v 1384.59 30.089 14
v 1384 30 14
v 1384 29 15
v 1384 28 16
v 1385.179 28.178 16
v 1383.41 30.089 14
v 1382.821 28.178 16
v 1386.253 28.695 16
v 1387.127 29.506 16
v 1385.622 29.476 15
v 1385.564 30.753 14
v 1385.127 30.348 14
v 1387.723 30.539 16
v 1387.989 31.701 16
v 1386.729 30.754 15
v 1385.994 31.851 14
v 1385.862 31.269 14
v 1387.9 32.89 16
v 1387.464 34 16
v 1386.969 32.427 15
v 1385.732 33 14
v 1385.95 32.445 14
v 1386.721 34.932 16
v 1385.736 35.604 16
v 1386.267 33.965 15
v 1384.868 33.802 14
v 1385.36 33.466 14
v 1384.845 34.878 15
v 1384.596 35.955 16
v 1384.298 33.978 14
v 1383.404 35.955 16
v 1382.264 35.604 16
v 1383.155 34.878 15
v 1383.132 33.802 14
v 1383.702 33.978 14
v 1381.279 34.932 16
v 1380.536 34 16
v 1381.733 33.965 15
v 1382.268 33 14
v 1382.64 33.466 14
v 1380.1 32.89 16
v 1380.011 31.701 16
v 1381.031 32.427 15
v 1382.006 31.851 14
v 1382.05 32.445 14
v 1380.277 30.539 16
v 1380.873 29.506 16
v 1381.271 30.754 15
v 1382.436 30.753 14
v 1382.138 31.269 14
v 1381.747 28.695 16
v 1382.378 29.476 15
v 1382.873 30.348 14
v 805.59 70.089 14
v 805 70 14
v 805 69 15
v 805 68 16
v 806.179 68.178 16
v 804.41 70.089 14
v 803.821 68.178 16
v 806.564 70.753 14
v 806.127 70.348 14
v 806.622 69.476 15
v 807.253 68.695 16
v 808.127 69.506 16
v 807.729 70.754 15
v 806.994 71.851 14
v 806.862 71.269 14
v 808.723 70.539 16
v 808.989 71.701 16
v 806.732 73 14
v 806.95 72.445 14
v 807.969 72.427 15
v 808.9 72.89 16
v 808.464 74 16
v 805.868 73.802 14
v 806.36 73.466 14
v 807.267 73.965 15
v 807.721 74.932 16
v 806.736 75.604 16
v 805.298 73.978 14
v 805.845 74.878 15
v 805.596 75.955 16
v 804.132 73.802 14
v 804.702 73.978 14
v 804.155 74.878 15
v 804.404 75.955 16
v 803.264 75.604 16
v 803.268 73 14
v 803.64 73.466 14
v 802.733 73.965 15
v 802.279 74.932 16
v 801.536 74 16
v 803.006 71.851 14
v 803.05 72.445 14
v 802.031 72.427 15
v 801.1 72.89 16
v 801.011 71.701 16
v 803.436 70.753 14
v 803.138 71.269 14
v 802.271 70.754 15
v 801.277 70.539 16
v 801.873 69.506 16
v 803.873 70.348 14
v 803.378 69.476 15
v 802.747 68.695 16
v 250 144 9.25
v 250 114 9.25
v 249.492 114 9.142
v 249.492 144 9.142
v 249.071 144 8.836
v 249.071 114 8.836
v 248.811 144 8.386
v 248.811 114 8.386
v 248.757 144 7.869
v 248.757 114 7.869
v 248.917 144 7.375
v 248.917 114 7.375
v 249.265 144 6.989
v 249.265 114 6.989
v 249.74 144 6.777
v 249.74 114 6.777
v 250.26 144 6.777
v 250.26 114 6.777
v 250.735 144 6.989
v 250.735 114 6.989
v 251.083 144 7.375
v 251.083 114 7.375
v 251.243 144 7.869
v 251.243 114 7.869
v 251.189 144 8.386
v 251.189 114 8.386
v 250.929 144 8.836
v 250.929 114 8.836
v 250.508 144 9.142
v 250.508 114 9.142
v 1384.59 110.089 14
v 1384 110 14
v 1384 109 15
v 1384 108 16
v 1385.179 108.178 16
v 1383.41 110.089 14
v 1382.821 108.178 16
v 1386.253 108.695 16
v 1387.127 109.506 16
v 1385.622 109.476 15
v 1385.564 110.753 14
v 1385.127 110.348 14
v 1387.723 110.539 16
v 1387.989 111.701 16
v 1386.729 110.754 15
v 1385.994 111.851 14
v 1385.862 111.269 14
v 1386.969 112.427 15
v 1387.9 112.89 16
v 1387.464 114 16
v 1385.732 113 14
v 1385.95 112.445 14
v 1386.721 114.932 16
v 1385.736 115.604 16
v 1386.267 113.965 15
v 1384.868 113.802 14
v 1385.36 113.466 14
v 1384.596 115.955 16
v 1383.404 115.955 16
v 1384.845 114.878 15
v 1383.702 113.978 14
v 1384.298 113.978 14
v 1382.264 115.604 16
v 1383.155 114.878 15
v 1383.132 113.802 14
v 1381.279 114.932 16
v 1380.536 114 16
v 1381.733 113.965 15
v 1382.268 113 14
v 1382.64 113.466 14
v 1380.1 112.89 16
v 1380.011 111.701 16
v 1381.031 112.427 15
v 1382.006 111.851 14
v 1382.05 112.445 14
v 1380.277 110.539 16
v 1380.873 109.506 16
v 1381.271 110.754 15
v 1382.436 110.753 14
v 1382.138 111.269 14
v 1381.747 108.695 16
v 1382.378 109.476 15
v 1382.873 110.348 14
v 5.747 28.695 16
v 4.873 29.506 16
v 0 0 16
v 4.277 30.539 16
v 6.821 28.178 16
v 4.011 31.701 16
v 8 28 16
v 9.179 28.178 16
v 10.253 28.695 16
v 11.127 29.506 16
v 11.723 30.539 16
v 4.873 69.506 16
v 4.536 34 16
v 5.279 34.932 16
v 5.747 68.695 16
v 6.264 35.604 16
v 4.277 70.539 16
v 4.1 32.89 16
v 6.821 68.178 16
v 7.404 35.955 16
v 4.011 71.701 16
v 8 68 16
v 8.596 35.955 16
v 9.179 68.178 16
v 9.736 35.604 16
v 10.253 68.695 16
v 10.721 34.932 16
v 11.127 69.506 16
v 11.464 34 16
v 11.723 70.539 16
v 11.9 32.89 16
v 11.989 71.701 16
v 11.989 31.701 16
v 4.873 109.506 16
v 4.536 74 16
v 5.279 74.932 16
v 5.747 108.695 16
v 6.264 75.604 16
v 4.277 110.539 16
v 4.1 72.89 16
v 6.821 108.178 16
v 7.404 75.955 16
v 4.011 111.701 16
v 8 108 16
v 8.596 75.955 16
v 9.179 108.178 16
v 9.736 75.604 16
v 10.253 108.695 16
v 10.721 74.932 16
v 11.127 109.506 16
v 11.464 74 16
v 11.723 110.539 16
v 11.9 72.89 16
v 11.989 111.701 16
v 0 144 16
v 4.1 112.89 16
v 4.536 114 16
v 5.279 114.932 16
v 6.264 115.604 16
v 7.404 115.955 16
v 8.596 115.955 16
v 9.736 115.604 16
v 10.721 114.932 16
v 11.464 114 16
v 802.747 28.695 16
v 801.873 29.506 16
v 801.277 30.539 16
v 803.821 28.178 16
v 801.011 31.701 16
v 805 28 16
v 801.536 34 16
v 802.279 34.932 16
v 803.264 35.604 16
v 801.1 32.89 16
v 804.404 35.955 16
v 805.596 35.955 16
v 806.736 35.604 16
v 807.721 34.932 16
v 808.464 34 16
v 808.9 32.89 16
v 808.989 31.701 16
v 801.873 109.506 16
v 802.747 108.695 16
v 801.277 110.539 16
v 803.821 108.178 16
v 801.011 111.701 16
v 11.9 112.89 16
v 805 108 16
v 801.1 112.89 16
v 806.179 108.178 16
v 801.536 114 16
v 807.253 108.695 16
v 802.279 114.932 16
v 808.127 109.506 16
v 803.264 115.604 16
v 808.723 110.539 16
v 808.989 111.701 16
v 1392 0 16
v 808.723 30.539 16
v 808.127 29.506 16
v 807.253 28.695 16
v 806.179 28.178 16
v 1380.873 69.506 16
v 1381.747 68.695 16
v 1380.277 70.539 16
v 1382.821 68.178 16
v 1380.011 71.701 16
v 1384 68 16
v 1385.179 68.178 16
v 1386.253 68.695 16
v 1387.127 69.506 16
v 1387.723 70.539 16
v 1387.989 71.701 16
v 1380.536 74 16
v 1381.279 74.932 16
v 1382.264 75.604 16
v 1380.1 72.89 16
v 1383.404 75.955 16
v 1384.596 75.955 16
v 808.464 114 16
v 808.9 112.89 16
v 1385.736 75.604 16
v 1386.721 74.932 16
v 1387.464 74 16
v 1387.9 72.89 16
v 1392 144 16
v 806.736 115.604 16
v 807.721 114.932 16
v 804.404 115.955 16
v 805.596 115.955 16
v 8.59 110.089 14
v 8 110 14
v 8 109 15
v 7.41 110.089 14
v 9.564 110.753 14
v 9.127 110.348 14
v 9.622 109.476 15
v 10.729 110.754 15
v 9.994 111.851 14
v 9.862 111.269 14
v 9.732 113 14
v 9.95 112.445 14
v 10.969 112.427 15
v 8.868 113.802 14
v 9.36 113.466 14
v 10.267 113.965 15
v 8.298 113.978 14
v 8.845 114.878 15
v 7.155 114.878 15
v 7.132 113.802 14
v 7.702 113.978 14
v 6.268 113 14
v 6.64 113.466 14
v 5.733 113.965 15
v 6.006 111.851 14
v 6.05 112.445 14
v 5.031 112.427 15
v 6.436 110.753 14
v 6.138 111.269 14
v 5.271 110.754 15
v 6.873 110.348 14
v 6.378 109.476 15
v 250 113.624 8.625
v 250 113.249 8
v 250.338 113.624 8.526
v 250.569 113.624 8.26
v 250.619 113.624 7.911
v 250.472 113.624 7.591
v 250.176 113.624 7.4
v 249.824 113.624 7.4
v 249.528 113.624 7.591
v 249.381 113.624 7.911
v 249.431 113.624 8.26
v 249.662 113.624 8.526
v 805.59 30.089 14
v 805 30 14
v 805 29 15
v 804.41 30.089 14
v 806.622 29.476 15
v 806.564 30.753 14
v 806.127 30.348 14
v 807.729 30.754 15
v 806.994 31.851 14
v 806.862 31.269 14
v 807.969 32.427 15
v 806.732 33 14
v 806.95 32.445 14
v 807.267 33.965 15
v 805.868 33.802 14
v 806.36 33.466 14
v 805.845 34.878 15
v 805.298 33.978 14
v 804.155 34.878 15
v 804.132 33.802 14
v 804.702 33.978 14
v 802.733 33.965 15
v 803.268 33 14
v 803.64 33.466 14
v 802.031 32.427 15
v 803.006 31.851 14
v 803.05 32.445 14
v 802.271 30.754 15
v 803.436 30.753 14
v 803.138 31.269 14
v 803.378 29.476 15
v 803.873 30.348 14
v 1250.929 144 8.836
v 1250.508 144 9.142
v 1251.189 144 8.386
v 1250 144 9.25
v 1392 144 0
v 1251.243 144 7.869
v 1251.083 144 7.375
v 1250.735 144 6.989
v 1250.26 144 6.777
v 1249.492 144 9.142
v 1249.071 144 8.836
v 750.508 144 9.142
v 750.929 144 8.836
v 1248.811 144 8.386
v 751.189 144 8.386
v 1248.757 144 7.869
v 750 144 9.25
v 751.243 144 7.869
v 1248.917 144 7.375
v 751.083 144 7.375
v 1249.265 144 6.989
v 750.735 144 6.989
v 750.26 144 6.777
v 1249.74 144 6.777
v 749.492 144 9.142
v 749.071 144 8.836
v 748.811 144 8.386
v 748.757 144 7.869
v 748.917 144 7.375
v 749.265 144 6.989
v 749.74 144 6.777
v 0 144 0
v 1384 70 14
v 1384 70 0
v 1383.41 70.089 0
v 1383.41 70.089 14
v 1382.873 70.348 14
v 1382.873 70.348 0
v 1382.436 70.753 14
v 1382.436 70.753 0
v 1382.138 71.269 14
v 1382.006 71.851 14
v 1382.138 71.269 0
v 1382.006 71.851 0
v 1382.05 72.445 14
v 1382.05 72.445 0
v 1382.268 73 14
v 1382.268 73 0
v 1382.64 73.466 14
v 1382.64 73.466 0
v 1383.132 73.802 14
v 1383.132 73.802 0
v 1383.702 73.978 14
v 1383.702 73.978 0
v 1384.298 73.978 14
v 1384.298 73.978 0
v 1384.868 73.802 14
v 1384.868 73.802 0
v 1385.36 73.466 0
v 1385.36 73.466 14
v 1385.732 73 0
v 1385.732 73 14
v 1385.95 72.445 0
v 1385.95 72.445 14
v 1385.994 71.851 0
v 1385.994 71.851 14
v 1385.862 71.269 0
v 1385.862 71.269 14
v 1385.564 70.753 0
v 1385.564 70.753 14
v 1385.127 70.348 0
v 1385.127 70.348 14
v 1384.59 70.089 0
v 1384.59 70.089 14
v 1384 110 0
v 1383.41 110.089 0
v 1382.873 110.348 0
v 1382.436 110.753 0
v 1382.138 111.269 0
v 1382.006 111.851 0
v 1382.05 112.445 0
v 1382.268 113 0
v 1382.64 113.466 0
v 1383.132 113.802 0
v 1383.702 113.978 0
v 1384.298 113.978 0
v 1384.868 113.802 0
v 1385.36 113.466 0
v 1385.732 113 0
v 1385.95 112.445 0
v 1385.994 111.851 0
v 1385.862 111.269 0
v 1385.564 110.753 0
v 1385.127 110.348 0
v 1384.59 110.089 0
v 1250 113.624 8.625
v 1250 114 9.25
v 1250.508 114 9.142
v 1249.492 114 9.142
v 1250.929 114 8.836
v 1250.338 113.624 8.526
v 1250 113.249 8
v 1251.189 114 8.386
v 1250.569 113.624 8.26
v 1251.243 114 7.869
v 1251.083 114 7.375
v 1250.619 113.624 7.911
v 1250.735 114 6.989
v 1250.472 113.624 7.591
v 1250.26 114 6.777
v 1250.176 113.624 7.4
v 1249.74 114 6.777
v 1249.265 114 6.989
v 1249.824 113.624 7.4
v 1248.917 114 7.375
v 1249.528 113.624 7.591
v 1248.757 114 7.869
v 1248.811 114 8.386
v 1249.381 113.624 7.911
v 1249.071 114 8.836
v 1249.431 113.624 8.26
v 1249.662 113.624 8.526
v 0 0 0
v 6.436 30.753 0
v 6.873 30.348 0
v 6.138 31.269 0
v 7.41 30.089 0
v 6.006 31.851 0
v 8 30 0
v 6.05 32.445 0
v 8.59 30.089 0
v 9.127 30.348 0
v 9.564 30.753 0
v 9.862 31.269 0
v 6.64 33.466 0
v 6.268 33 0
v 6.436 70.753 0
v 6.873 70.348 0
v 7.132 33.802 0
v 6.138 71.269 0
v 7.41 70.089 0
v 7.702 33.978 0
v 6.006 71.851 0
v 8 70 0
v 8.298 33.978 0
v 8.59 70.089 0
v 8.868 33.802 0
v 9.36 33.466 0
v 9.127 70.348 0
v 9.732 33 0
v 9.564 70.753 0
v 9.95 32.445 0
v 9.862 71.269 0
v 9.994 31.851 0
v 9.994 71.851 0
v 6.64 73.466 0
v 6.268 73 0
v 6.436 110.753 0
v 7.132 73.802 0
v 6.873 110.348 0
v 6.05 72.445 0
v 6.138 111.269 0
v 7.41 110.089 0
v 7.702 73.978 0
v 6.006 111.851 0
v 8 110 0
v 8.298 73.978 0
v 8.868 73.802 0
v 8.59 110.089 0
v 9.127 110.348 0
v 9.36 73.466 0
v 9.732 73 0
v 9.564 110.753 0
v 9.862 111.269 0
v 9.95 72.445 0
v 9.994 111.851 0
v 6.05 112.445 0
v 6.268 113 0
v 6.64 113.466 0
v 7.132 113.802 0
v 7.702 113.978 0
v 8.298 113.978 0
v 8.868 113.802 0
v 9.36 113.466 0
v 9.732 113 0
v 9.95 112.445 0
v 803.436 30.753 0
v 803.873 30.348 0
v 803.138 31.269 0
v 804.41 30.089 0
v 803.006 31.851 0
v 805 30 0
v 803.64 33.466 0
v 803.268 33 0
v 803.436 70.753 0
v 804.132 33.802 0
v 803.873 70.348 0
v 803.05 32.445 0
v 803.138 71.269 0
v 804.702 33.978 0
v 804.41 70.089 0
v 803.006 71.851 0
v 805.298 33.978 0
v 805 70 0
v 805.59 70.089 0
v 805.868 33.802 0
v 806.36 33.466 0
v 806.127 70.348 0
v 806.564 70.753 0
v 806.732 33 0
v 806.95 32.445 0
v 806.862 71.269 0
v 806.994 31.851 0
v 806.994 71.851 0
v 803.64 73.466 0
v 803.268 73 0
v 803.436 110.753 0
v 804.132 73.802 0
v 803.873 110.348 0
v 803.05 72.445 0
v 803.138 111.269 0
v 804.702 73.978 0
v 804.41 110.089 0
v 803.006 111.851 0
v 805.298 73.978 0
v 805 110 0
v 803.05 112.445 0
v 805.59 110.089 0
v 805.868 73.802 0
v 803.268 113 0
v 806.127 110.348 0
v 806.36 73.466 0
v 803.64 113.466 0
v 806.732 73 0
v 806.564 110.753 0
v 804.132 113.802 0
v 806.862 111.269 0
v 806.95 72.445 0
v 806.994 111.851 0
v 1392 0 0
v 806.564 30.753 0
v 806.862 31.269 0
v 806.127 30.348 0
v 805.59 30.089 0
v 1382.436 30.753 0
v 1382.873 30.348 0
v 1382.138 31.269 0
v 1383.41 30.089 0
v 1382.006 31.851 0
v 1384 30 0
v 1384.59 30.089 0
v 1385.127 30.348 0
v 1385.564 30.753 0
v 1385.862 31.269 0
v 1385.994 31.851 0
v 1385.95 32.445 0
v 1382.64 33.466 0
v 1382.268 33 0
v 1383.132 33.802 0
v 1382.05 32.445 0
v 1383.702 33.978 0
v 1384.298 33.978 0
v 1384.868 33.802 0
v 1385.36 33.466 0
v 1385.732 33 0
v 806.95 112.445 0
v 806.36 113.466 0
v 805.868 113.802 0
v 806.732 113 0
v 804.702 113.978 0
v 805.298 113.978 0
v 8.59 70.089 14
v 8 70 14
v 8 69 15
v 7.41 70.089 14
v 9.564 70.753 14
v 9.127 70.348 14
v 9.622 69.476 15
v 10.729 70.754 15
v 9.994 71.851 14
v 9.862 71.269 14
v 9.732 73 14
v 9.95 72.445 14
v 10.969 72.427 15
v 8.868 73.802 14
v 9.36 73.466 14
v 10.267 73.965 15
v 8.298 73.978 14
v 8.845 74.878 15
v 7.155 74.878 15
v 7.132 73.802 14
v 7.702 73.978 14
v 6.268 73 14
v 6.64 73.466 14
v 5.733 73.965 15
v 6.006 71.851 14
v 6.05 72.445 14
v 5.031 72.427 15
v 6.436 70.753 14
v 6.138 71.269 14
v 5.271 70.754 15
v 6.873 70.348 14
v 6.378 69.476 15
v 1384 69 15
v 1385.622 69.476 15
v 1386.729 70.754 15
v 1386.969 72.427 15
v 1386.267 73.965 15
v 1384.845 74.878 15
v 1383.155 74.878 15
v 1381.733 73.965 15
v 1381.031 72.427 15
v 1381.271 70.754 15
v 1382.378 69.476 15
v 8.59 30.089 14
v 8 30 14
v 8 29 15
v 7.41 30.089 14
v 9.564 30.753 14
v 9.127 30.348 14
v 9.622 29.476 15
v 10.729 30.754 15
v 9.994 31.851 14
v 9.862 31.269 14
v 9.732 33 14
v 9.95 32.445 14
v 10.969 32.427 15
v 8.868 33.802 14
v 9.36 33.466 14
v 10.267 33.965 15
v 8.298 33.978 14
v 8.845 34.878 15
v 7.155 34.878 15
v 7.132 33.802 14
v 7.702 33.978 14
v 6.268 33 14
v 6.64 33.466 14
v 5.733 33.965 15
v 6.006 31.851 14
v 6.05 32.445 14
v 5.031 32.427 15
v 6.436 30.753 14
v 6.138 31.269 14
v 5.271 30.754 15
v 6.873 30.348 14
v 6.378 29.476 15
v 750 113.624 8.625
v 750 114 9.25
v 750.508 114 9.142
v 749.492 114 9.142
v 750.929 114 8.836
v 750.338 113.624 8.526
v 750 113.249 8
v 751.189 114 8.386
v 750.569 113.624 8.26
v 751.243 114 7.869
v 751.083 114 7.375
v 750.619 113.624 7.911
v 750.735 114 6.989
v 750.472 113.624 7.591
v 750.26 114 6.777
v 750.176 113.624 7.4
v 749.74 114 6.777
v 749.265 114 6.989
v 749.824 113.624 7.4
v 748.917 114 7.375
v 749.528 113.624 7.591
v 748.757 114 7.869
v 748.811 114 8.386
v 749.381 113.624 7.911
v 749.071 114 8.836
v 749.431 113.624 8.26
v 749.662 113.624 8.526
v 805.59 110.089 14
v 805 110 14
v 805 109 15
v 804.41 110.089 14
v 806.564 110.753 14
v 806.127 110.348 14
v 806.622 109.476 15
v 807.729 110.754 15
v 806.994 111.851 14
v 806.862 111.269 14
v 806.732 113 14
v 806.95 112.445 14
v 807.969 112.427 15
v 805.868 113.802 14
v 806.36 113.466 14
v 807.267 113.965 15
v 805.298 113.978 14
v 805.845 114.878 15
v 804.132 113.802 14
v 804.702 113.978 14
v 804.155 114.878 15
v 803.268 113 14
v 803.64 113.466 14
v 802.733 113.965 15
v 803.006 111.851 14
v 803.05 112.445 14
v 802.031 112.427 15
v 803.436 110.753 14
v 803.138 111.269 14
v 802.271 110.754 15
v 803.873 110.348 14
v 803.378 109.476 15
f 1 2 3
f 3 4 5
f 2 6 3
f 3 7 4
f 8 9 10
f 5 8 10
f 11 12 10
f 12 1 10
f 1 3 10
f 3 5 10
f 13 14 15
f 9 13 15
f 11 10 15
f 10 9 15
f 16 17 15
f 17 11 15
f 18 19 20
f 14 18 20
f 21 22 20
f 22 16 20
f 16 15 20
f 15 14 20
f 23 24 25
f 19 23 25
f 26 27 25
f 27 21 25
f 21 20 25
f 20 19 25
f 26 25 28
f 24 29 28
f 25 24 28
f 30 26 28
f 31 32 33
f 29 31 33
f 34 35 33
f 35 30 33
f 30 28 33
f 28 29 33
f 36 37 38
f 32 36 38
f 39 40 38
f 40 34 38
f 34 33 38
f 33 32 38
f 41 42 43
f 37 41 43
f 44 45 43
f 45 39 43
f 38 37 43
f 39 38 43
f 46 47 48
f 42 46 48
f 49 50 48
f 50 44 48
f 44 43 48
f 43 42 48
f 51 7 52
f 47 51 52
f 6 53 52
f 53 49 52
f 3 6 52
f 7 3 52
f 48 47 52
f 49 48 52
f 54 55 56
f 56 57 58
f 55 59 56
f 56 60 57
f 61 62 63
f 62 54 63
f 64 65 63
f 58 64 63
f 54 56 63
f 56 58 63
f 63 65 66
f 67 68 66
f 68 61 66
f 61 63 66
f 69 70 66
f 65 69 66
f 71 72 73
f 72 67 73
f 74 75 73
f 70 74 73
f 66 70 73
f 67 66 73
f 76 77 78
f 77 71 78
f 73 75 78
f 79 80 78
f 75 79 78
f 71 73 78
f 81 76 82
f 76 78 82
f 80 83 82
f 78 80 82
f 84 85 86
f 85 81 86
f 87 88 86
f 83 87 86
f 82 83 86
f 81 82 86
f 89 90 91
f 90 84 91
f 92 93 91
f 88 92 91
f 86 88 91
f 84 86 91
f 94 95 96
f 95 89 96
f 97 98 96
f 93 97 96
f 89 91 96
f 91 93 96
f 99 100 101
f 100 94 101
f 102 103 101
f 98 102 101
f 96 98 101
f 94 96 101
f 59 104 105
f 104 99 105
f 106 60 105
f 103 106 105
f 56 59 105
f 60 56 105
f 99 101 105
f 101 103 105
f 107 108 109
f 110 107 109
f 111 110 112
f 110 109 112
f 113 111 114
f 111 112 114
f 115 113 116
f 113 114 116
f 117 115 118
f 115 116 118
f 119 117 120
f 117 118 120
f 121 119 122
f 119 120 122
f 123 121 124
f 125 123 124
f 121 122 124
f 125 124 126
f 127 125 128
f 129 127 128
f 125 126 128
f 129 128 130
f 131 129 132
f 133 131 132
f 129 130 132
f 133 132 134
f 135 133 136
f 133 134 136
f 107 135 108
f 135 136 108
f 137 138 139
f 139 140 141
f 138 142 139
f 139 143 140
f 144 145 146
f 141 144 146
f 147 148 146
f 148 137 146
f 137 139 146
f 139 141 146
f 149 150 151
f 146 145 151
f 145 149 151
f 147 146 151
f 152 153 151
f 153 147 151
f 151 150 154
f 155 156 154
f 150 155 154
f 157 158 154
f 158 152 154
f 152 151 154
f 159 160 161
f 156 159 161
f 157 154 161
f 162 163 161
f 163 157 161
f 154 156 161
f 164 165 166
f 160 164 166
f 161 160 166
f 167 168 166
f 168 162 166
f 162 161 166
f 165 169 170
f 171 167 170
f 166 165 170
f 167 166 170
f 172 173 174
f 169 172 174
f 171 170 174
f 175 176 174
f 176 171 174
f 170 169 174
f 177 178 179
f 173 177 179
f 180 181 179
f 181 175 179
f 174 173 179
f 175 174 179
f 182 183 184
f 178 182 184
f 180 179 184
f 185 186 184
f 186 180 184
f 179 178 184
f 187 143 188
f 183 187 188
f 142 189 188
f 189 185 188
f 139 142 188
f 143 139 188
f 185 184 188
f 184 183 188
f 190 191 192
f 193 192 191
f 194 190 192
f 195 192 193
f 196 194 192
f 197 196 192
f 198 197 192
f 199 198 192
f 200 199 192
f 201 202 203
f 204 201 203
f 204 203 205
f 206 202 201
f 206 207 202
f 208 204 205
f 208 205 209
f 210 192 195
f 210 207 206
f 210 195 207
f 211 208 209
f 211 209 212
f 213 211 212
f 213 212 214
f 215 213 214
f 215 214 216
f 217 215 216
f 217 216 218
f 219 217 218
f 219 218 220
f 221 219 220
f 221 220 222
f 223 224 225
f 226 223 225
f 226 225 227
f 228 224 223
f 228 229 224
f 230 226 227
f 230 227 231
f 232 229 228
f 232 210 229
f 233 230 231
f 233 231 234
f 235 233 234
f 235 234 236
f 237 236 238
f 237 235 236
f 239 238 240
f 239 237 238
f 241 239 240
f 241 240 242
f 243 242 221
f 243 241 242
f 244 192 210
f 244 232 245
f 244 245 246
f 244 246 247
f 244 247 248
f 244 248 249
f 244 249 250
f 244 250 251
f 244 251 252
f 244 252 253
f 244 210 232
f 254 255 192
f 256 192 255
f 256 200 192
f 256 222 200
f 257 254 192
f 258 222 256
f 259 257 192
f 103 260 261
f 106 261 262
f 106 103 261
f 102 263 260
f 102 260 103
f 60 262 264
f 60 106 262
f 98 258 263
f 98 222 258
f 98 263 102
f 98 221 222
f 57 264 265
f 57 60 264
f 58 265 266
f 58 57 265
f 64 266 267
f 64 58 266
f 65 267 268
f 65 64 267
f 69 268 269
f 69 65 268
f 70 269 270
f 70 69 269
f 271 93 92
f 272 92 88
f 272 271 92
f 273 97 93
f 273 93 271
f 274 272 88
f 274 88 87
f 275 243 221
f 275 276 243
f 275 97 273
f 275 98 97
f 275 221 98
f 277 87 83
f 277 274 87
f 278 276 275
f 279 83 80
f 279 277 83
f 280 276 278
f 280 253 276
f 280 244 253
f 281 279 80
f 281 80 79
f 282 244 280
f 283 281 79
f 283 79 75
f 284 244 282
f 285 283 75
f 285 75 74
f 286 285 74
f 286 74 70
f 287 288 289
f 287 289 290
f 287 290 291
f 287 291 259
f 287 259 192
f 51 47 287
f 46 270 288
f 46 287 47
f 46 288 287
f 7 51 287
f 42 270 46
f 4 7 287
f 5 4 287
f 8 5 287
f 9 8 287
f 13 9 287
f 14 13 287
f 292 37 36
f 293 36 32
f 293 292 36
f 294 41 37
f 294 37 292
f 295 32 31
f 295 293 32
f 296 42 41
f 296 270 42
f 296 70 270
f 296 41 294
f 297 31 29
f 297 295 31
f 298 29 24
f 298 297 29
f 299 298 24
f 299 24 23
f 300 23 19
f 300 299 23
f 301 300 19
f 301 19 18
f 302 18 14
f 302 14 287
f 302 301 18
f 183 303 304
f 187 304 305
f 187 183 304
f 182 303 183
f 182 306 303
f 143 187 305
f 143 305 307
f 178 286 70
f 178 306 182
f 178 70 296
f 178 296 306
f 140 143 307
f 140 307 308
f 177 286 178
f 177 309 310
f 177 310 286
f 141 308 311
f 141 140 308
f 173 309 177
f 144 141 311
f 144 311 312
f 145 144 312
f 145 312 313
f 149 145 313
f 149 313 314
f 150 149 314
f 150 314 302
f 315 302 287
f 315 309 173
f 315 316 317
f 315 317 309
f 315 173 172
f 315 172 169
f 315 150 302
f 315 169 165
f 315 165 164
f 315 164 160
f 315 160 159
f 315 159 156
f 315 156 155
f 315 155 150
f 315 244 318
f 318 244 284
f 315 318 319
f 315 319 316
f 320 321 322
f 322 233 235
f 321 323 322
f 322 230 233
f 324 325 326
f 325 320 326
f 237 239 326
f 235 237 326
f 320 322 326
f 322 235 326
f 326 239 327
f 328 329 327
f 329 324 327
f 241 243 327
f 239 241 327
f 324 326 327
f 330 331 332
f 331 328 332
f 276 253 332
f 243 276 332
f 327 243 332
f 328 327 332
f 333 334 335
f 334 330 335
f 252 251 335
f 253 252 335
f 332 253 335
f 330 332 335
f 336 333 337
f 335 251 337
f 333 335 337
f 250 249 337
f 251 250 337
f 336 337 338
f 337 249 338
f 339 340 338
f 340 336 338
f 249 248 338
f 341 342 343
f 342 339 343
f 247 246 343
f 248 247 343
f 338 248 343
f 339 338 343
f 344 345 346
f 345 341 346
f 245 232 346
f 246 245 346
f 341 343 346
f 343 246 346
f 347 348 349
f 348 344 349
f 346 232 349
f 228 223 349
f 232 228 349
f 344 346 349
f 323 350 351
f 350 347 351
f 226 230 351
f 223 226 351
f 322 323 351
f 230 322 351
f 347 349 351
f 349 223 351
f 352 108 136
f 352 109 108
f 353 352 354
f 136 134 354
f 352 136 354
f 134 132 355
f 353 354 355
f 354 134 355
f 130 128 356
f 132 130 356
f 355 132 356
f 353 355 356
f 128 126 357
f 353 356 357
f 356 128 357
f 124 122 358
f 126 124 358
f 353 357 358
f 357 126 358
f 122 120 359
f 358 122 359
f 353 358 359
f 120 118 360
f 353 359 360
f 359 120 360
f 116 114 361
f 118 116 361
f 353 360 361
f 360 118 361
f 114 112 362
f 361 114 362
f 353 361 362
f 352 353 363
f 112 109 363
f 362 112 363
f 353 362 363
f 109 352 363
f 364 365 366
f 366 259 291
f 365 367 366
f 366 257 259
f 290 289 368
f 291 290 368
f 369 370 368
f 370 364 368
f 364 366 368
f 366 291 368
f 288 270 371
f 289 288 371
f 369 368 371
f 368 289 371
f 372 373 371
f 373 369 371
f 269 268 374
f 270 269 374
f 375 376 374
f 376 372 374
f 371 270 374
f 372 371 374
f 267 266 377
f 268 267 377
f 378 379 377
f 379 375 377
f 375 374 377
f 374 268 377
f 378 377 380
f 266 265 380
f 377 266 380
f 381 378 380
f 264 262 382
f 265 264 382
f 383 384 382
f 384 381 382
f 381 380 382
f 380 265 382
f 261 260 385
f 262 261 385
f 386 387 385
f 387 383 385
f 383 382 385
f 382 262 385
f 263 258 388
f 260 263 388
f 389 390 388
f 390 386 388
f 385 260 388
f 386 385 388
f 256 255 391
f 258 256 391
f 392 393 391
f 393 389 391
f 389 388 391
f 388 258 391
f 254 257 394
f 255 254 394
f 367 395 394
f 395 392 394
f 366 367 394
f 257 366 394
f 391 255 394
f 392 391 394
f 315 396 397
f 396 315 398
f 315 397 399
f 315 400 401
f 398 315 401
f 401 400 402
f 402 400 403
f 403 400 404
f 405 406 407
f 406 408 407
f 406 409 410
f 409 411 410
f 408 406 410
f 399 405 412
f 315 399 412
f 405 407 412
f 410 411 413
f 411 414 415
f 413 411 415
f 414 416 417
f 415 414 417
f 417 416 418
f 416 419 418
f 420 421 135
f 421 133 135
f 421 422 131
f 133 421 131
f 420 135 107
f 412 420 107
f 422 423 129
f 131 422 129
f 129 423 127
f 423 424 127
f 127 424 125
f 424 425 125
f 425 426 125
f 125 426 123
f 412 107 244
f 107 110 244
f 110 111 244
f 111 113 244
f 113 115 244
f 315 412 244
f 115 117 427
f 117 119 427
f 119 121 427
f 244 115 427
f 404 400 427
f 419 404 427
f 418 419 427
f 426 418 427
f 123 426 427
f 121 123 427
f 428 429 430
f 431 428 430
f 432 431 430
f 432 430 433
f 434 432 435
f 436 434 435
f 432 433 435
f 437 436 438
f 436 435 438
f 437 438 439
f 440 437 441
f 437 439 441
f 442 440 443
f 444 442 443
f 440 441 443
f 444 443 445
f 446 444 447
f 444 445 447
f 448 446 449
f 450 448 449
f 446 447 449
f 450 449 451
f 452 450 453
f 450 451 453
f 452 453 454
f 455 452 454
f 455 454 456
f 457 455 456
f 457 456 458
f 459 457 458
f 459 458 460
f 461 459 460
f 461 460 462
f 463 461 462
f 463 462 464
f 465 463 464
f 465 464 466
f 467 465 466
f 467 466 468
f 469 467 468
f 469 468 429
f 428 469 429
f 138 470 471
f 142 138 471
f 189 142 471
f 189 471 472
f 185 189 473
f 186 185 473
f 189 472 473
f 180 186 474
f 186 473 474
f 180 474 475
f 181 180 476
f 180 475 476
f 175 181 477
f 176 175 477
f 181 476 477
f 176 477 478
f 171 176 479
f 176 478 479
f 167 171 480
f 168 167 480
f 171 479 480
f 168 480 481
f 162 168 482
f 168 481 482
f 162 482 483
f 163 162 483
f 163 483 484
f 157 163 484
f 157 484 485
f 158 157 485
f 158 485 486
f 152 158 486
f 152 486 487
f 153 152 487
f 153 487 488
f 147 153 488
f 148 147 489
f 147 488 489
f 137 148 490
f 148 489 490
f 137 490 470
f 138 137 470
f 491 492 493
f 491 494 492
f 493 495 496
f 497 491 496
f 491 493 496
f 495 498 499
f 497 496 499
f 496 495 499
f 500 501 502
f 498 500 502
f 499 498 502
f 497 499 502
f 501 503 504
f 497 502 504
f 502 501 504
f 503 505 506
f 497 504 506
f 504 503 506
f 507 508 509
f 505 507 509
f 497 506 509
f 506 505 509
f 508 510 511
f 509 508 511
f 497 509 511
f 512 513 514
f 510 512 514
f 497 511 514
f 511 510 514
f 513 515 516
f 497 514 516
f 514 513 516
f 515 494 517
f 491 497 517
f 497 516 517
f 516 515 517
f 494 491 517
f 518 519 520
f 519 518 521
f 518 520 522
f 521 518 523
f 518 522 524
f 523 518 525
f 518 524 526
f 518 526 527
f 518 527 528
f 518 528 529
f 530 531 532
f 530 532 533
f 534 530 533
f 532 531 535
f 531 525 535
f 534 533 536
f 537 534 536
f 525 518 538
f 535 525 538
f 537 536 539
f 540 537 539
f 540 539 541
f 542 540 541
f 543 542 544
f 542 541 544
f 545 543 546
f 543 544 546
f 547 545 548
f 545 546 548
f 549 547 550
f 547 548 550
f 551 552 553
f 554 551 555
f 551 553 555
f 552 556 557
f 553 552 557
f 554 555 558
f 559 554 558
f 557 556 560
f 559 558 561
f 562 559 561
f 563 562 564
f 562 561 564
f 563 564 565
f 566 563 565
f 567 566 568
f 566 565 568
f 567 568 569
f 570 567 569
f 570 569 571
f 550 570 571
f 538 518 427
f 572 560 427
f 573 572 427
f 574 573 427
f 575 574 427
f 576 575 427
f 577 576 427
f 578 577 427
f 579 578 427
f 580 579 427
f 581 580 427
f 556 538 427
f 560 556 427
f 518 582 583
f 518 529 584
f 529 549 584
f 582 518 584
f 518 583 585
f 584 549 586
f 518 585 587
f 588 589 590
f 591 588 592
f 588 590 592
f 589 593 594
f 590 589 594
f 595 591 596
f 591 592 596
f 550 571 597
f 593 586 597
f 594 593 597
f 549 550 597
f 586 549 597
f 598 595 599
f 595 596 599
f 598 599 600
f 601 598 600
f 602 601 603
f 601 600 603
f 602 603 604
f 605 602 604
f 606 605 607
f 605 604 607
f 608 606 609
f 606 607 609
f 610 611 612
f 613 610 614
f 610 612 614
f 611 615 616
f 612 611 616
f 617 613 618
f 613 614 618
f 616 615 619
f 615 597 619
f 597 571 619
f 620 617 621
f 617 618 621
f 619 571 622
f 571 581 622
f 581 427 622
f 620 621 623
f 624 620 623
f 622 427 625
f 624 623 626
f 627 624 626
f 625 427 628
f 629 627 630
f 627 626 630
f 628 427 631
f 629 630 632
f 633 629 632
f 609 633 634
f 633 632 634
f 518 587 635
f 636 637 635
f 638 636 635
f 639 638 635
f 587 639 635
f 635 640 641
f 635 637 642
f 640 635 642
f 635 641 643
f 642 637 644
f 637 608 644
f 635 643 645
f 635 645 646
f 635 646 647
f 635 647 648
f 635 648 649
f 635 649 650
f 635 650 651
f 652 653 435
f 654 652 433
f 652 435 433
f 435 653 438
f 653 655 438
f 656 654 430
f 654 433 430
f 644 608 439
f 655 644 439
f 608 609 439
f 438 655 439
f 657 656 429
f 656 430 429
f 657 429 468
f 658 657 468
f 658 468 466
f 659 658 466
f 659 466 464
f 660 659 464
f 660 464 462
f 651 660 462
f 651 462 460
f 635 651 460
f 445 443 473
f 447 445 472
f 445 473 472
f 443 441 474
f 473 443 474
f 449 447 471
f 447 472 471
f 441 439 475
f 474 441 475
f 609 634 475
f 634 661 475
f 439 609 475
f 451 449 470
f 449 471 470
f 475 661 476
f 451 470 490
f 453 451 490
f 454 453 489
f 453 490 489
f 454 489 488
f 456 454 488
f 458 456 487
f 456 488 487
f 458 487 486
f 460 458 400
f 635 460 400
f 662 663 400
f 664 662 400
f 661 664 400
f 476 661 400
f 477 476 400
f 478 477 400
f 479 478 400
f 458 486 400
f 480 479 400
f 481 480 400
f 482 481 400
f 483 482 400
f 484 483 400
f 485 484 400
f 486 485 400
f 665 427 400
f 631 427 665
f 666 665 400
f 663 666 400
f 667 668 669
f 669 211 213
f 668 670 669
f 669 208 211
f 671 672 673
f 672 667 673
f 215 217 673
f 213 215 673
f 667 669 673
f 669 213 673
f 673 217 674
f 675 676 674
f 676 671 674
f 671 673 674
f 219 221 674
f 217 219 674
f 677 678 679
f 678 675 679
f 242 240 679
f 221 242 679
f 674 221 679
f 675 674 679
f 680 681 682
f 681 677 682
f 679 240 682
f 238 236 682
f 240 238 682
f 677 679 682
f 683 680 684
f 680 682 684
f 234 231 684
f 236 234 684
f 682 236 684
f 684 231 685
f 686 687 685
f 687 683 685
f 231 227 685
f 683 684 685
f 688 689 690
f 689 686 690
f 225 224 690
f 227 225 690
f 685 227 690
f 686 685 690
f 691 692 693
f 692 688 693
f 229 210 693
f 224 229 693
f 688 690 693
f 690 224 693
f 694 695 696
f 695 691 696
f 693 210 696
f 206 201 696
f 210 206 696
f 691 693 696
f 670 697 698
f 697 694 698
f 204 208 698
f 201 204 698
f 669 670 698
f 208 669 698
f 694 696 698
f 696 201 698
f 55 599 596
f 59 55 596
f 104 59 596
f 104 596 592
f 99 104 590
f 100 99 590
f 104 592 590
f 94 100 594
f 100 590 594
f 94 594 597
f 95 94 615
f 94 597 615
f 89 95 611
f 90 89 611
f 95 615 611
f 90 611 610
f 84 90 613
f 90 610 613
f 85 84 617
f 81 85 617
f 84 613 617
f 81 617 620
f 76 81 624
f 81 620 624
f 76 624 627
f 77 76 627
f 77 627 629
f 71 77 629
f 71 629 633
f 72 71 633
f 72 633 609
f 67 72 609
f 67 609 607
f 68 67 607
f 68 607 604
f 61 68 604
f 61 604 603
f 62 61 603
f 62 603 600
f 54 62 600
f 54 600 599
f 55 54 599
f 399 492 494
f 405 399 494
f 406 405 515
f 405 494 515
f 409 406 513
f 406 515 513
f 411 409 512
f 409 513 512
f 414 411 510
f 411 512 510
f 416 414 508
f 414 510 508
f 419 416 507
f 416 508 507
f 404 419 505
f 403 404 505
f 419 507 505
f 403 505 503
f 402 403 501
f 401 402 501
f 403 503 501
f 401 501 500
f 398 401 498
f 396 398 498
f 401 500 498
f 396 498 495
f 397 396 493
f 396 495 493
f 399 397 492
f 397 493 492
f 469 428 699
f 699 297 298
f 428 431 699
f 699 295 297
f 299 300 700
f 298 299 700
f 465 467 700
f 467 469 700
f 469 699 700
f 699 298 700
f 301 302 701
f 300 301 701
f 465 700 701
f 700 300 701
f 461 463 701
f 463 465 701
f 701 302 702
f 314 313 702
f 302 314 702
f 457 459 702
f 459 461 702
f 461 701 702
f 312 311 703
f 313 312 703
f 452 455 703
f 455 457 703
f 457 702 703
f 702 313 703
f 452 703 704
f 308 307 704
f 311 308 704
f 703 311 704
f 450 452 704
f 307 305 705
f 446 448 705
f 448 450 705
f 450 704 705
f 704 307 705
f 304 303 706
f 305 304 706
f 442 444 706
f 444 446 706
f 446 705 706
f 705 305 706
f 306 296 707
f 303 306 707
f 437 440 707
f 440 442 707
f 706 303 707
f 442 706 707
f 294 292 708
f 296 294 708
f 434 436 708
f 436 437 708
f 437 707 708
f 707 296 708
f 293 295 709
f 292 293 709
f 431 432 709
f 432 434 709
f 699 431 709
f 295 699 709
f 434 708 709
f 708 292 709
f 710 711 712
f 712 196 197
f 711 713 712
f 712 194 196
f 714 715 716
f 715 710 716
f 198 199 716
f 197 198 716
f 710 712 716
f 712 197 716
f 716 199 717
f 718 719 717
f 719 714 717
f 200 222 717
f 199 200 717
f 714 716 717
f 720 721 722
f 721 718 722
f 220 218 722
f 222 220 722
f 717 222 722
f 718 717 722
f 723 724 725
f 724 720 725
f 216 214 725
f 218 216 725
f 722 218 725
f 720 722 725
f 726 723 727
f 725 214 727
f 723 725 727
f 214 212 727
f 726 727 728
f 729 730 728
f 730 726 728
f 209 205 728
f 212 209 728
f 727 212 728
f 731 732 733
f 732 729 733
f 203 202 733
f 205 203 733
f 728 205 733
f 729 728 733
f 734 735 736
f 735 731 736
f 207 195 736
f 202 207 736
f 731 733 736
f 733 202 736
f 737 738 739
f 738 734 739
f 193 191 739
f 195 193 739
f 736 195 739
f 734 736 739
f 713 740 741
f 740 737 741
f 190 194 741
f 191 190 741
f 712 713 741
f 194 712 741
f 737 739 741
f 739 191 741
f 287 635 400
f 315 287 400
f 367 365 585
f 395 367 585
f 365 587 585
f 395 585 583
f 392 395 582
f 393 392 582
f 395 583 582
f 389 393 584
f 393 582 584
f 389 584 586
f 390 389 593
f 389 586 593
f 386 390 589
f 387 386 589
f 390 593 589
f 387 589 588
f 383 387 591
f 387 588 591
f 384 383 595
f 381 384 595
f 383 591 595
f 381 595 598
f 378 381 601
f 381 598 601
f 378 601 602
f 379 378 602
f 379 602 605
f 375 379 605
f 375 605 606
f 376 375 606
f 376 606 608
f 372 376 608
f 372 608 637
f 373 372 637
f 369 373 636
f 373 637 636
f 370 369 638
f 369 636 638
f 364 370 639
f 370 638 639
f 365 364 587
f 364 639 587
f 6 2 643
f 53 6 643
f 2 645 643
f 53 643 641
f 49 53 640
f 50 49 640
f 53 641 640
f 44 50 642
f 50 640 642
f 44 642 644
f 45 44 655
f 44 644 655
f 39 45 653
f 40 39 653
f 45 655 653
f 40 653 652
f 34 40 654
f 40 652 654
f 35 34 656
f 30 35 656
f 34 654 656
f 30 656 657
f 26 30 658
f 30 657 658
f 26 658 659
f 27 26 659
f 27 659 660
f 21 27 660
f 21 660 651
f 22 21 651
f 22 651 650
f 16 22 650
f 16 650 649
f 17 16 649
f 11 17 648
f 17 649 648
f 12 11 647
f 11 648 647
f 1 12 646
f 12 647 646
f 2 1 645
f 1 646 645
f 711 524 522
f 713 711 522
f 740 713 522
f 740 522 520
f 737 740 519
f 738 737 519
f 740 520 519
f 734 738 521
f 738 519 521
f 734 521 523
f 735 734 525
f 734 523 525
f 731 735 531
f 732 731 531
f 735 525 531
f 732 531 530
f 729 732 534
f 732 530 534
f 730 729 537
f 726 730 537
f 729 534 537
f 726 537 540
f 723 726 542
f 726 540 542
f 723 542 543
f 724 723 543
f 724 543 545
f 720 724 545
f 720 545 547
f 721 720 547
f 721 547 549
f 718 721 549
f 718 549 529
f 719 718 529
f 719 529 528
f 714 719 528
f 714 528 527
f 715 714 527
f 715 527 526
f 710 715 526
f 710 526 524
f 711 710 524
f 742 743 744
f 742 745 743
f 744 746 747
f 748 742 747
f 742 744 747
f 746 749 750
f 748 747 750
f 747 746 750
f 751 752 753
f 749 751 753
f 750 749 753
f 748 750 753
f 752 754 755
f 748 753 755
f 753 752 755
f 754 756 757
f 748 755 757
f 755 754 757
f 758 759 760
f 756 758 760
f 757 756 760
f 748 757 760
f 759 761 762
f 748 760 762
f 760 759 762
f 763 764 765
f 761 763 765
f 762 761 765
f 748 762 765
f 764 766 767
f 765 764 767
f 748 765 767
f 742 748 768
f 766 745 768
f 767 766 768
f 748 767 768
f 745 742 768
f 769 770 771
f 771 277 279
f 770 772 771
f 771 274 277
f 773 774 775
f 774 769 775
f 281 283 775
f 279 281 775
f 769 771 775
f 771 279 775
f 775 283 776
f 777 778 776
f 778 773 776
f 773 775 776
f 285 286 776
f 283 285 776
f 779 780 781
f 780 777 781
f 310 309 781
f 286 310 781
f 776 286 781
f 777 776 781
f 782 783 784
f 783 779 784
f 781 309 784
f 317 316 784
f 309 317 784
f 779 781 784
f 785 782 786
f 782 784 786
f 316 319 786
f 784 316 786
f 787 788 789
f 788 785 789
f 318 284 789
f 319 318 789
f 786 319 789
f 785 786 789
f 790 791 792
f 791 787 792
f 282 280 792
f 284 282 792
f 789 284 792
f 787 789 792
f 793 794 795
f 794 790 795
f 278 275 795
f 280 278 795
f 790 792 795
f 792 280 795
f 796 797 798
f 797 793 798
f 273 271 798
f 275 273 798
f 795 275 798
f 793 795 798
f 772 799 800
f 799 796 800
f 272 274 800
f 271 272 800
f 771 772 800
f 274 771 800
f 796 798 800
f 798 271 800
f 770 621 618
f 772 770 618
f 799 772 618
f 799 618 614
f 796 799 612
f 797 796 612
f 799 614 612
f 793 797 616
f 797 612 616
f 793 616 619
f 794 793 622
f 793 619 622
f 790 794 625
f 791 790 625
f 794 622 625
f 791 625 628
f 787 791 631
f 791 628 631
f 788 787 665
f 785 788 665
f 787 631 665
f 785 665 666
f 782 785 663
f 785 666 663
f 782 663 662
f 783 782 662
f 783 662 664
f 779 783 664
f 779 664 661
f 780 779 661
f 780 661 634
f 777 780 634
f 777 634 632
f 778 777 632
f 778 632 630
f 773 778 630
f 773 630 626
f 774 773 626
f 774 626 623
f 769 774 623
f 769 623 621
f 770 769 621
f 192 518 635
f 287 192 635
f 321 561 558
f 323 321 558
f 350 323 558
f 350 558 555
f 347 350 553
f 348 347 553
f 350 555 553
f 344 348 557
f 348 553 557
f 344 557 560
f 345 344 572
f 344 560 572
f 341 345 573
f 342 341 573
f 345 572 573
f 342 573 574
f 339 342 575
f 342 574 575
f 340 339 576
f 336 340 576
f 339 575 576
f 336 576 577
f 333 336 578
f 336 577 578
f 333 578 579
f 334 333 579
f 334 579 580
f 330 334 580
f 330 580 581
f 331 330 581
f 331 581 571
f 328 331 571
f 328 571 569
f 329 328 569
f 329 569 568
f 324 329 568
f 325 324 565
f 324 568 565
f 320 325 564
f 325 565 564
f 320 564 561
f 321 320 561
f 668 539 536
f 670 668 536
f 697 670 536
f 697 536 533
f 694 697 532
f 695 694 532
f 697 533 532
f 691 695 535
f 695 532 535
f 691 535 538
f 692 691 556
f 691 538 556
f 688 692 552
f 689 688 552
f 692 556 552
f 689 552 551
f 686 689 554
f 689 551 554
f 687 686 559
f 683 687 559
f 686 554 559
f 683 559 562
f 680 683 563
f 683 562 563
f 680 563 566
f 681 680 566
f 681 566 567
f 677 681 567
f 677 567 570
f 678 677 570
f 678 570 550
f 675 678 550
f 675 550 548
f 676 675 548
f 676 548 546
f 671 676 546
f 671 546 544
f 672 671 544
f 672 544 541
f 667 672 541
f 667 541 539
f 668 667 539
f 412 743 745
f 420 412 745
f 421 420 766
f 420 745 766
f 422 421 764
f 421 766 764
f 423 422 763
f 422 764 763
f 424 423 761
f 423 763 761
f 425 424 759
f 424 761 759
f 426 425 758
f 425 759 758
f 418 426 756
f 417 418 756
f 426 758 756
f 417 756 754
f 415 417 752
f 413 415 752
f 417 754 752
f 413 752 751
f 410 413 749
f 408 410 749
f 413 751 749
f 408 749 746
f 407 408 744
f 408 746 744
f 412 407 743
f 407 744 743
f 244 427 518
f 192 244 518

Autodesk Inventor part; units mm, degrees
ref_plane "YZ Plane" through (0, 0, 0) normal (1, 0, 0) x (0, 1, 0)
ref_plane "XZ Plane" through (0, 0, 0) normal (0, 1, 0) x (-1, 0, 0)
ref_plane "XY Plane" through (0, 0, 0) normal (0, 0, 1) x (1, 0, 0)
sketch "Skizze1" plane through (0, 0, 0) normal (0, 0, 1) x (1, 0, 0)
  line L0 (0, 0) -> (1392, 0)
  line L1 (1392, 0) -> (1392, 144)
  line L2 (1392, 144) -> (0, 144)
  line L3 (0, 144) -> (0, 0)
  line L4 (1384, 144) -> (1384, 0) construction
  line L5 (1392, 112) -> (0, 112) construction
  line L6 (1392, 32) -> (0, 32) construction
  circle A0 centre (1384, 112) radius 1.5
  circle A1 centre (1384, 32) radius 1.5
  line L7 (8, 144) -> (8, 0) construction
  circle A2 centre (8, 112) radius 1.5
  circle A3 centre (8, 72) radius 1.5
  circle A4 centre (8, 32) radius 1.5
  circle A5 centre (1384, 72) radius 1.5
  circle A6 centre (805, 112) radius 1.5
  circle A7 centre (805, 72) radius 1.5
  circle A8 centre (805, 32) radius 1.5
  line L8 (805, 144) -> (805, 0) construction
  point P0 (1392, 72)
  point P1 (805, 72)
  dimension "d0" = 1392
  dimension "d1" = 144
  dimension "d20" = 8
  dimension "d21" = 40
  dimension "d22" = 40
  dimension "d23" = 3
  dimension "d24" = 3
  dimension "d25" = 8
  dimension "d26" = 3
  dimension "d27" = 3
  dimension "d28" = 3
  dimension "d29" = 3
  dimension "d131" = 3
  dimension "d132" = 3
  dimension "d133" = 3
  dimension "d134" = 805
extrude "Extrusion1" add sketch "Skizze1" along normal blind 16 contours L3 L2 L1 L0 | A6 | A7 | A8
sketch "Skizze2" plane through (0, 0, 16) normal (0, 0, 1) x (1, 0, 0)
  circle A0 centre (1384, 112) radius 1.5 projected
  circle A1 centre (1384, 72) radius 1.5 projected
  circle A2 centre (1384, 32) radius 1.5 projected
  circle A3 centre (8, 72) radius 1.5 projected
  circle A4 centre (8, 112) radius 1.5 projected
  circle A5 centre (8, 32) radius 1.5 projected
  circle A6 centre (805, 32) radius 1.5 projected
  circle A7 centre (805, 112) radius 1.5 projected
  circle A8 centre (805, 72) radius 1.5 projected
  point P0 (0, 0)
  point P1 (805, 72)
  point P2 (821.0338, 32)
  point P3 (821.0338, 72)
hole "Bohrung7" at (1384, 112, 16) at (1384, 72, 16) at (1384, 32, 16) at (8, 72, 16) at (8, 32, 16) at (8, 112, 16) at (805, 32, 16) at (805, 112, 16) at (805, 72, 16) direction (0, 0, -1) diameter 4 end through all countersink diameter 8 countersink angle 90
sketch "Skizze3" plane through (0, 144, 0) normal (0, 1, 0) x (1, 0, 0)
  line L0 (0, 0) -> (1392, 0) construction
  line L1 (1392, 0) -> (1392, -16) construction
  line L2 (1392, -16) -> (0, -16) construction
  line L3 (0, -16) -> (0, 0) construction
  line L4 (0, 0) -> (0, -16) projected
  line L5 (0, -8) -> (1392, -8) construction
  line L6 (1392, 0) -> (1392, -16) projected
  line L7 (0, -16) -> (1392, -16) construction
  line L8 (696, -16) -> (696, 0) construction
  point P0 (250, -8)
  point P1 (750, -8)
  point P2 (1250, -8)
  dimension "d135" = 500
  dimension "d136" = 500
  dimension "d137" = 250
hole "Bohrung12" at (250, 144, 8) at (750, 144, 8) at (1250, 144, 8) direction (0, -1, 0) diameter 2.5 depth 30 tip angle 118
properties part number "licht_150_back" material "Spanplatte"
